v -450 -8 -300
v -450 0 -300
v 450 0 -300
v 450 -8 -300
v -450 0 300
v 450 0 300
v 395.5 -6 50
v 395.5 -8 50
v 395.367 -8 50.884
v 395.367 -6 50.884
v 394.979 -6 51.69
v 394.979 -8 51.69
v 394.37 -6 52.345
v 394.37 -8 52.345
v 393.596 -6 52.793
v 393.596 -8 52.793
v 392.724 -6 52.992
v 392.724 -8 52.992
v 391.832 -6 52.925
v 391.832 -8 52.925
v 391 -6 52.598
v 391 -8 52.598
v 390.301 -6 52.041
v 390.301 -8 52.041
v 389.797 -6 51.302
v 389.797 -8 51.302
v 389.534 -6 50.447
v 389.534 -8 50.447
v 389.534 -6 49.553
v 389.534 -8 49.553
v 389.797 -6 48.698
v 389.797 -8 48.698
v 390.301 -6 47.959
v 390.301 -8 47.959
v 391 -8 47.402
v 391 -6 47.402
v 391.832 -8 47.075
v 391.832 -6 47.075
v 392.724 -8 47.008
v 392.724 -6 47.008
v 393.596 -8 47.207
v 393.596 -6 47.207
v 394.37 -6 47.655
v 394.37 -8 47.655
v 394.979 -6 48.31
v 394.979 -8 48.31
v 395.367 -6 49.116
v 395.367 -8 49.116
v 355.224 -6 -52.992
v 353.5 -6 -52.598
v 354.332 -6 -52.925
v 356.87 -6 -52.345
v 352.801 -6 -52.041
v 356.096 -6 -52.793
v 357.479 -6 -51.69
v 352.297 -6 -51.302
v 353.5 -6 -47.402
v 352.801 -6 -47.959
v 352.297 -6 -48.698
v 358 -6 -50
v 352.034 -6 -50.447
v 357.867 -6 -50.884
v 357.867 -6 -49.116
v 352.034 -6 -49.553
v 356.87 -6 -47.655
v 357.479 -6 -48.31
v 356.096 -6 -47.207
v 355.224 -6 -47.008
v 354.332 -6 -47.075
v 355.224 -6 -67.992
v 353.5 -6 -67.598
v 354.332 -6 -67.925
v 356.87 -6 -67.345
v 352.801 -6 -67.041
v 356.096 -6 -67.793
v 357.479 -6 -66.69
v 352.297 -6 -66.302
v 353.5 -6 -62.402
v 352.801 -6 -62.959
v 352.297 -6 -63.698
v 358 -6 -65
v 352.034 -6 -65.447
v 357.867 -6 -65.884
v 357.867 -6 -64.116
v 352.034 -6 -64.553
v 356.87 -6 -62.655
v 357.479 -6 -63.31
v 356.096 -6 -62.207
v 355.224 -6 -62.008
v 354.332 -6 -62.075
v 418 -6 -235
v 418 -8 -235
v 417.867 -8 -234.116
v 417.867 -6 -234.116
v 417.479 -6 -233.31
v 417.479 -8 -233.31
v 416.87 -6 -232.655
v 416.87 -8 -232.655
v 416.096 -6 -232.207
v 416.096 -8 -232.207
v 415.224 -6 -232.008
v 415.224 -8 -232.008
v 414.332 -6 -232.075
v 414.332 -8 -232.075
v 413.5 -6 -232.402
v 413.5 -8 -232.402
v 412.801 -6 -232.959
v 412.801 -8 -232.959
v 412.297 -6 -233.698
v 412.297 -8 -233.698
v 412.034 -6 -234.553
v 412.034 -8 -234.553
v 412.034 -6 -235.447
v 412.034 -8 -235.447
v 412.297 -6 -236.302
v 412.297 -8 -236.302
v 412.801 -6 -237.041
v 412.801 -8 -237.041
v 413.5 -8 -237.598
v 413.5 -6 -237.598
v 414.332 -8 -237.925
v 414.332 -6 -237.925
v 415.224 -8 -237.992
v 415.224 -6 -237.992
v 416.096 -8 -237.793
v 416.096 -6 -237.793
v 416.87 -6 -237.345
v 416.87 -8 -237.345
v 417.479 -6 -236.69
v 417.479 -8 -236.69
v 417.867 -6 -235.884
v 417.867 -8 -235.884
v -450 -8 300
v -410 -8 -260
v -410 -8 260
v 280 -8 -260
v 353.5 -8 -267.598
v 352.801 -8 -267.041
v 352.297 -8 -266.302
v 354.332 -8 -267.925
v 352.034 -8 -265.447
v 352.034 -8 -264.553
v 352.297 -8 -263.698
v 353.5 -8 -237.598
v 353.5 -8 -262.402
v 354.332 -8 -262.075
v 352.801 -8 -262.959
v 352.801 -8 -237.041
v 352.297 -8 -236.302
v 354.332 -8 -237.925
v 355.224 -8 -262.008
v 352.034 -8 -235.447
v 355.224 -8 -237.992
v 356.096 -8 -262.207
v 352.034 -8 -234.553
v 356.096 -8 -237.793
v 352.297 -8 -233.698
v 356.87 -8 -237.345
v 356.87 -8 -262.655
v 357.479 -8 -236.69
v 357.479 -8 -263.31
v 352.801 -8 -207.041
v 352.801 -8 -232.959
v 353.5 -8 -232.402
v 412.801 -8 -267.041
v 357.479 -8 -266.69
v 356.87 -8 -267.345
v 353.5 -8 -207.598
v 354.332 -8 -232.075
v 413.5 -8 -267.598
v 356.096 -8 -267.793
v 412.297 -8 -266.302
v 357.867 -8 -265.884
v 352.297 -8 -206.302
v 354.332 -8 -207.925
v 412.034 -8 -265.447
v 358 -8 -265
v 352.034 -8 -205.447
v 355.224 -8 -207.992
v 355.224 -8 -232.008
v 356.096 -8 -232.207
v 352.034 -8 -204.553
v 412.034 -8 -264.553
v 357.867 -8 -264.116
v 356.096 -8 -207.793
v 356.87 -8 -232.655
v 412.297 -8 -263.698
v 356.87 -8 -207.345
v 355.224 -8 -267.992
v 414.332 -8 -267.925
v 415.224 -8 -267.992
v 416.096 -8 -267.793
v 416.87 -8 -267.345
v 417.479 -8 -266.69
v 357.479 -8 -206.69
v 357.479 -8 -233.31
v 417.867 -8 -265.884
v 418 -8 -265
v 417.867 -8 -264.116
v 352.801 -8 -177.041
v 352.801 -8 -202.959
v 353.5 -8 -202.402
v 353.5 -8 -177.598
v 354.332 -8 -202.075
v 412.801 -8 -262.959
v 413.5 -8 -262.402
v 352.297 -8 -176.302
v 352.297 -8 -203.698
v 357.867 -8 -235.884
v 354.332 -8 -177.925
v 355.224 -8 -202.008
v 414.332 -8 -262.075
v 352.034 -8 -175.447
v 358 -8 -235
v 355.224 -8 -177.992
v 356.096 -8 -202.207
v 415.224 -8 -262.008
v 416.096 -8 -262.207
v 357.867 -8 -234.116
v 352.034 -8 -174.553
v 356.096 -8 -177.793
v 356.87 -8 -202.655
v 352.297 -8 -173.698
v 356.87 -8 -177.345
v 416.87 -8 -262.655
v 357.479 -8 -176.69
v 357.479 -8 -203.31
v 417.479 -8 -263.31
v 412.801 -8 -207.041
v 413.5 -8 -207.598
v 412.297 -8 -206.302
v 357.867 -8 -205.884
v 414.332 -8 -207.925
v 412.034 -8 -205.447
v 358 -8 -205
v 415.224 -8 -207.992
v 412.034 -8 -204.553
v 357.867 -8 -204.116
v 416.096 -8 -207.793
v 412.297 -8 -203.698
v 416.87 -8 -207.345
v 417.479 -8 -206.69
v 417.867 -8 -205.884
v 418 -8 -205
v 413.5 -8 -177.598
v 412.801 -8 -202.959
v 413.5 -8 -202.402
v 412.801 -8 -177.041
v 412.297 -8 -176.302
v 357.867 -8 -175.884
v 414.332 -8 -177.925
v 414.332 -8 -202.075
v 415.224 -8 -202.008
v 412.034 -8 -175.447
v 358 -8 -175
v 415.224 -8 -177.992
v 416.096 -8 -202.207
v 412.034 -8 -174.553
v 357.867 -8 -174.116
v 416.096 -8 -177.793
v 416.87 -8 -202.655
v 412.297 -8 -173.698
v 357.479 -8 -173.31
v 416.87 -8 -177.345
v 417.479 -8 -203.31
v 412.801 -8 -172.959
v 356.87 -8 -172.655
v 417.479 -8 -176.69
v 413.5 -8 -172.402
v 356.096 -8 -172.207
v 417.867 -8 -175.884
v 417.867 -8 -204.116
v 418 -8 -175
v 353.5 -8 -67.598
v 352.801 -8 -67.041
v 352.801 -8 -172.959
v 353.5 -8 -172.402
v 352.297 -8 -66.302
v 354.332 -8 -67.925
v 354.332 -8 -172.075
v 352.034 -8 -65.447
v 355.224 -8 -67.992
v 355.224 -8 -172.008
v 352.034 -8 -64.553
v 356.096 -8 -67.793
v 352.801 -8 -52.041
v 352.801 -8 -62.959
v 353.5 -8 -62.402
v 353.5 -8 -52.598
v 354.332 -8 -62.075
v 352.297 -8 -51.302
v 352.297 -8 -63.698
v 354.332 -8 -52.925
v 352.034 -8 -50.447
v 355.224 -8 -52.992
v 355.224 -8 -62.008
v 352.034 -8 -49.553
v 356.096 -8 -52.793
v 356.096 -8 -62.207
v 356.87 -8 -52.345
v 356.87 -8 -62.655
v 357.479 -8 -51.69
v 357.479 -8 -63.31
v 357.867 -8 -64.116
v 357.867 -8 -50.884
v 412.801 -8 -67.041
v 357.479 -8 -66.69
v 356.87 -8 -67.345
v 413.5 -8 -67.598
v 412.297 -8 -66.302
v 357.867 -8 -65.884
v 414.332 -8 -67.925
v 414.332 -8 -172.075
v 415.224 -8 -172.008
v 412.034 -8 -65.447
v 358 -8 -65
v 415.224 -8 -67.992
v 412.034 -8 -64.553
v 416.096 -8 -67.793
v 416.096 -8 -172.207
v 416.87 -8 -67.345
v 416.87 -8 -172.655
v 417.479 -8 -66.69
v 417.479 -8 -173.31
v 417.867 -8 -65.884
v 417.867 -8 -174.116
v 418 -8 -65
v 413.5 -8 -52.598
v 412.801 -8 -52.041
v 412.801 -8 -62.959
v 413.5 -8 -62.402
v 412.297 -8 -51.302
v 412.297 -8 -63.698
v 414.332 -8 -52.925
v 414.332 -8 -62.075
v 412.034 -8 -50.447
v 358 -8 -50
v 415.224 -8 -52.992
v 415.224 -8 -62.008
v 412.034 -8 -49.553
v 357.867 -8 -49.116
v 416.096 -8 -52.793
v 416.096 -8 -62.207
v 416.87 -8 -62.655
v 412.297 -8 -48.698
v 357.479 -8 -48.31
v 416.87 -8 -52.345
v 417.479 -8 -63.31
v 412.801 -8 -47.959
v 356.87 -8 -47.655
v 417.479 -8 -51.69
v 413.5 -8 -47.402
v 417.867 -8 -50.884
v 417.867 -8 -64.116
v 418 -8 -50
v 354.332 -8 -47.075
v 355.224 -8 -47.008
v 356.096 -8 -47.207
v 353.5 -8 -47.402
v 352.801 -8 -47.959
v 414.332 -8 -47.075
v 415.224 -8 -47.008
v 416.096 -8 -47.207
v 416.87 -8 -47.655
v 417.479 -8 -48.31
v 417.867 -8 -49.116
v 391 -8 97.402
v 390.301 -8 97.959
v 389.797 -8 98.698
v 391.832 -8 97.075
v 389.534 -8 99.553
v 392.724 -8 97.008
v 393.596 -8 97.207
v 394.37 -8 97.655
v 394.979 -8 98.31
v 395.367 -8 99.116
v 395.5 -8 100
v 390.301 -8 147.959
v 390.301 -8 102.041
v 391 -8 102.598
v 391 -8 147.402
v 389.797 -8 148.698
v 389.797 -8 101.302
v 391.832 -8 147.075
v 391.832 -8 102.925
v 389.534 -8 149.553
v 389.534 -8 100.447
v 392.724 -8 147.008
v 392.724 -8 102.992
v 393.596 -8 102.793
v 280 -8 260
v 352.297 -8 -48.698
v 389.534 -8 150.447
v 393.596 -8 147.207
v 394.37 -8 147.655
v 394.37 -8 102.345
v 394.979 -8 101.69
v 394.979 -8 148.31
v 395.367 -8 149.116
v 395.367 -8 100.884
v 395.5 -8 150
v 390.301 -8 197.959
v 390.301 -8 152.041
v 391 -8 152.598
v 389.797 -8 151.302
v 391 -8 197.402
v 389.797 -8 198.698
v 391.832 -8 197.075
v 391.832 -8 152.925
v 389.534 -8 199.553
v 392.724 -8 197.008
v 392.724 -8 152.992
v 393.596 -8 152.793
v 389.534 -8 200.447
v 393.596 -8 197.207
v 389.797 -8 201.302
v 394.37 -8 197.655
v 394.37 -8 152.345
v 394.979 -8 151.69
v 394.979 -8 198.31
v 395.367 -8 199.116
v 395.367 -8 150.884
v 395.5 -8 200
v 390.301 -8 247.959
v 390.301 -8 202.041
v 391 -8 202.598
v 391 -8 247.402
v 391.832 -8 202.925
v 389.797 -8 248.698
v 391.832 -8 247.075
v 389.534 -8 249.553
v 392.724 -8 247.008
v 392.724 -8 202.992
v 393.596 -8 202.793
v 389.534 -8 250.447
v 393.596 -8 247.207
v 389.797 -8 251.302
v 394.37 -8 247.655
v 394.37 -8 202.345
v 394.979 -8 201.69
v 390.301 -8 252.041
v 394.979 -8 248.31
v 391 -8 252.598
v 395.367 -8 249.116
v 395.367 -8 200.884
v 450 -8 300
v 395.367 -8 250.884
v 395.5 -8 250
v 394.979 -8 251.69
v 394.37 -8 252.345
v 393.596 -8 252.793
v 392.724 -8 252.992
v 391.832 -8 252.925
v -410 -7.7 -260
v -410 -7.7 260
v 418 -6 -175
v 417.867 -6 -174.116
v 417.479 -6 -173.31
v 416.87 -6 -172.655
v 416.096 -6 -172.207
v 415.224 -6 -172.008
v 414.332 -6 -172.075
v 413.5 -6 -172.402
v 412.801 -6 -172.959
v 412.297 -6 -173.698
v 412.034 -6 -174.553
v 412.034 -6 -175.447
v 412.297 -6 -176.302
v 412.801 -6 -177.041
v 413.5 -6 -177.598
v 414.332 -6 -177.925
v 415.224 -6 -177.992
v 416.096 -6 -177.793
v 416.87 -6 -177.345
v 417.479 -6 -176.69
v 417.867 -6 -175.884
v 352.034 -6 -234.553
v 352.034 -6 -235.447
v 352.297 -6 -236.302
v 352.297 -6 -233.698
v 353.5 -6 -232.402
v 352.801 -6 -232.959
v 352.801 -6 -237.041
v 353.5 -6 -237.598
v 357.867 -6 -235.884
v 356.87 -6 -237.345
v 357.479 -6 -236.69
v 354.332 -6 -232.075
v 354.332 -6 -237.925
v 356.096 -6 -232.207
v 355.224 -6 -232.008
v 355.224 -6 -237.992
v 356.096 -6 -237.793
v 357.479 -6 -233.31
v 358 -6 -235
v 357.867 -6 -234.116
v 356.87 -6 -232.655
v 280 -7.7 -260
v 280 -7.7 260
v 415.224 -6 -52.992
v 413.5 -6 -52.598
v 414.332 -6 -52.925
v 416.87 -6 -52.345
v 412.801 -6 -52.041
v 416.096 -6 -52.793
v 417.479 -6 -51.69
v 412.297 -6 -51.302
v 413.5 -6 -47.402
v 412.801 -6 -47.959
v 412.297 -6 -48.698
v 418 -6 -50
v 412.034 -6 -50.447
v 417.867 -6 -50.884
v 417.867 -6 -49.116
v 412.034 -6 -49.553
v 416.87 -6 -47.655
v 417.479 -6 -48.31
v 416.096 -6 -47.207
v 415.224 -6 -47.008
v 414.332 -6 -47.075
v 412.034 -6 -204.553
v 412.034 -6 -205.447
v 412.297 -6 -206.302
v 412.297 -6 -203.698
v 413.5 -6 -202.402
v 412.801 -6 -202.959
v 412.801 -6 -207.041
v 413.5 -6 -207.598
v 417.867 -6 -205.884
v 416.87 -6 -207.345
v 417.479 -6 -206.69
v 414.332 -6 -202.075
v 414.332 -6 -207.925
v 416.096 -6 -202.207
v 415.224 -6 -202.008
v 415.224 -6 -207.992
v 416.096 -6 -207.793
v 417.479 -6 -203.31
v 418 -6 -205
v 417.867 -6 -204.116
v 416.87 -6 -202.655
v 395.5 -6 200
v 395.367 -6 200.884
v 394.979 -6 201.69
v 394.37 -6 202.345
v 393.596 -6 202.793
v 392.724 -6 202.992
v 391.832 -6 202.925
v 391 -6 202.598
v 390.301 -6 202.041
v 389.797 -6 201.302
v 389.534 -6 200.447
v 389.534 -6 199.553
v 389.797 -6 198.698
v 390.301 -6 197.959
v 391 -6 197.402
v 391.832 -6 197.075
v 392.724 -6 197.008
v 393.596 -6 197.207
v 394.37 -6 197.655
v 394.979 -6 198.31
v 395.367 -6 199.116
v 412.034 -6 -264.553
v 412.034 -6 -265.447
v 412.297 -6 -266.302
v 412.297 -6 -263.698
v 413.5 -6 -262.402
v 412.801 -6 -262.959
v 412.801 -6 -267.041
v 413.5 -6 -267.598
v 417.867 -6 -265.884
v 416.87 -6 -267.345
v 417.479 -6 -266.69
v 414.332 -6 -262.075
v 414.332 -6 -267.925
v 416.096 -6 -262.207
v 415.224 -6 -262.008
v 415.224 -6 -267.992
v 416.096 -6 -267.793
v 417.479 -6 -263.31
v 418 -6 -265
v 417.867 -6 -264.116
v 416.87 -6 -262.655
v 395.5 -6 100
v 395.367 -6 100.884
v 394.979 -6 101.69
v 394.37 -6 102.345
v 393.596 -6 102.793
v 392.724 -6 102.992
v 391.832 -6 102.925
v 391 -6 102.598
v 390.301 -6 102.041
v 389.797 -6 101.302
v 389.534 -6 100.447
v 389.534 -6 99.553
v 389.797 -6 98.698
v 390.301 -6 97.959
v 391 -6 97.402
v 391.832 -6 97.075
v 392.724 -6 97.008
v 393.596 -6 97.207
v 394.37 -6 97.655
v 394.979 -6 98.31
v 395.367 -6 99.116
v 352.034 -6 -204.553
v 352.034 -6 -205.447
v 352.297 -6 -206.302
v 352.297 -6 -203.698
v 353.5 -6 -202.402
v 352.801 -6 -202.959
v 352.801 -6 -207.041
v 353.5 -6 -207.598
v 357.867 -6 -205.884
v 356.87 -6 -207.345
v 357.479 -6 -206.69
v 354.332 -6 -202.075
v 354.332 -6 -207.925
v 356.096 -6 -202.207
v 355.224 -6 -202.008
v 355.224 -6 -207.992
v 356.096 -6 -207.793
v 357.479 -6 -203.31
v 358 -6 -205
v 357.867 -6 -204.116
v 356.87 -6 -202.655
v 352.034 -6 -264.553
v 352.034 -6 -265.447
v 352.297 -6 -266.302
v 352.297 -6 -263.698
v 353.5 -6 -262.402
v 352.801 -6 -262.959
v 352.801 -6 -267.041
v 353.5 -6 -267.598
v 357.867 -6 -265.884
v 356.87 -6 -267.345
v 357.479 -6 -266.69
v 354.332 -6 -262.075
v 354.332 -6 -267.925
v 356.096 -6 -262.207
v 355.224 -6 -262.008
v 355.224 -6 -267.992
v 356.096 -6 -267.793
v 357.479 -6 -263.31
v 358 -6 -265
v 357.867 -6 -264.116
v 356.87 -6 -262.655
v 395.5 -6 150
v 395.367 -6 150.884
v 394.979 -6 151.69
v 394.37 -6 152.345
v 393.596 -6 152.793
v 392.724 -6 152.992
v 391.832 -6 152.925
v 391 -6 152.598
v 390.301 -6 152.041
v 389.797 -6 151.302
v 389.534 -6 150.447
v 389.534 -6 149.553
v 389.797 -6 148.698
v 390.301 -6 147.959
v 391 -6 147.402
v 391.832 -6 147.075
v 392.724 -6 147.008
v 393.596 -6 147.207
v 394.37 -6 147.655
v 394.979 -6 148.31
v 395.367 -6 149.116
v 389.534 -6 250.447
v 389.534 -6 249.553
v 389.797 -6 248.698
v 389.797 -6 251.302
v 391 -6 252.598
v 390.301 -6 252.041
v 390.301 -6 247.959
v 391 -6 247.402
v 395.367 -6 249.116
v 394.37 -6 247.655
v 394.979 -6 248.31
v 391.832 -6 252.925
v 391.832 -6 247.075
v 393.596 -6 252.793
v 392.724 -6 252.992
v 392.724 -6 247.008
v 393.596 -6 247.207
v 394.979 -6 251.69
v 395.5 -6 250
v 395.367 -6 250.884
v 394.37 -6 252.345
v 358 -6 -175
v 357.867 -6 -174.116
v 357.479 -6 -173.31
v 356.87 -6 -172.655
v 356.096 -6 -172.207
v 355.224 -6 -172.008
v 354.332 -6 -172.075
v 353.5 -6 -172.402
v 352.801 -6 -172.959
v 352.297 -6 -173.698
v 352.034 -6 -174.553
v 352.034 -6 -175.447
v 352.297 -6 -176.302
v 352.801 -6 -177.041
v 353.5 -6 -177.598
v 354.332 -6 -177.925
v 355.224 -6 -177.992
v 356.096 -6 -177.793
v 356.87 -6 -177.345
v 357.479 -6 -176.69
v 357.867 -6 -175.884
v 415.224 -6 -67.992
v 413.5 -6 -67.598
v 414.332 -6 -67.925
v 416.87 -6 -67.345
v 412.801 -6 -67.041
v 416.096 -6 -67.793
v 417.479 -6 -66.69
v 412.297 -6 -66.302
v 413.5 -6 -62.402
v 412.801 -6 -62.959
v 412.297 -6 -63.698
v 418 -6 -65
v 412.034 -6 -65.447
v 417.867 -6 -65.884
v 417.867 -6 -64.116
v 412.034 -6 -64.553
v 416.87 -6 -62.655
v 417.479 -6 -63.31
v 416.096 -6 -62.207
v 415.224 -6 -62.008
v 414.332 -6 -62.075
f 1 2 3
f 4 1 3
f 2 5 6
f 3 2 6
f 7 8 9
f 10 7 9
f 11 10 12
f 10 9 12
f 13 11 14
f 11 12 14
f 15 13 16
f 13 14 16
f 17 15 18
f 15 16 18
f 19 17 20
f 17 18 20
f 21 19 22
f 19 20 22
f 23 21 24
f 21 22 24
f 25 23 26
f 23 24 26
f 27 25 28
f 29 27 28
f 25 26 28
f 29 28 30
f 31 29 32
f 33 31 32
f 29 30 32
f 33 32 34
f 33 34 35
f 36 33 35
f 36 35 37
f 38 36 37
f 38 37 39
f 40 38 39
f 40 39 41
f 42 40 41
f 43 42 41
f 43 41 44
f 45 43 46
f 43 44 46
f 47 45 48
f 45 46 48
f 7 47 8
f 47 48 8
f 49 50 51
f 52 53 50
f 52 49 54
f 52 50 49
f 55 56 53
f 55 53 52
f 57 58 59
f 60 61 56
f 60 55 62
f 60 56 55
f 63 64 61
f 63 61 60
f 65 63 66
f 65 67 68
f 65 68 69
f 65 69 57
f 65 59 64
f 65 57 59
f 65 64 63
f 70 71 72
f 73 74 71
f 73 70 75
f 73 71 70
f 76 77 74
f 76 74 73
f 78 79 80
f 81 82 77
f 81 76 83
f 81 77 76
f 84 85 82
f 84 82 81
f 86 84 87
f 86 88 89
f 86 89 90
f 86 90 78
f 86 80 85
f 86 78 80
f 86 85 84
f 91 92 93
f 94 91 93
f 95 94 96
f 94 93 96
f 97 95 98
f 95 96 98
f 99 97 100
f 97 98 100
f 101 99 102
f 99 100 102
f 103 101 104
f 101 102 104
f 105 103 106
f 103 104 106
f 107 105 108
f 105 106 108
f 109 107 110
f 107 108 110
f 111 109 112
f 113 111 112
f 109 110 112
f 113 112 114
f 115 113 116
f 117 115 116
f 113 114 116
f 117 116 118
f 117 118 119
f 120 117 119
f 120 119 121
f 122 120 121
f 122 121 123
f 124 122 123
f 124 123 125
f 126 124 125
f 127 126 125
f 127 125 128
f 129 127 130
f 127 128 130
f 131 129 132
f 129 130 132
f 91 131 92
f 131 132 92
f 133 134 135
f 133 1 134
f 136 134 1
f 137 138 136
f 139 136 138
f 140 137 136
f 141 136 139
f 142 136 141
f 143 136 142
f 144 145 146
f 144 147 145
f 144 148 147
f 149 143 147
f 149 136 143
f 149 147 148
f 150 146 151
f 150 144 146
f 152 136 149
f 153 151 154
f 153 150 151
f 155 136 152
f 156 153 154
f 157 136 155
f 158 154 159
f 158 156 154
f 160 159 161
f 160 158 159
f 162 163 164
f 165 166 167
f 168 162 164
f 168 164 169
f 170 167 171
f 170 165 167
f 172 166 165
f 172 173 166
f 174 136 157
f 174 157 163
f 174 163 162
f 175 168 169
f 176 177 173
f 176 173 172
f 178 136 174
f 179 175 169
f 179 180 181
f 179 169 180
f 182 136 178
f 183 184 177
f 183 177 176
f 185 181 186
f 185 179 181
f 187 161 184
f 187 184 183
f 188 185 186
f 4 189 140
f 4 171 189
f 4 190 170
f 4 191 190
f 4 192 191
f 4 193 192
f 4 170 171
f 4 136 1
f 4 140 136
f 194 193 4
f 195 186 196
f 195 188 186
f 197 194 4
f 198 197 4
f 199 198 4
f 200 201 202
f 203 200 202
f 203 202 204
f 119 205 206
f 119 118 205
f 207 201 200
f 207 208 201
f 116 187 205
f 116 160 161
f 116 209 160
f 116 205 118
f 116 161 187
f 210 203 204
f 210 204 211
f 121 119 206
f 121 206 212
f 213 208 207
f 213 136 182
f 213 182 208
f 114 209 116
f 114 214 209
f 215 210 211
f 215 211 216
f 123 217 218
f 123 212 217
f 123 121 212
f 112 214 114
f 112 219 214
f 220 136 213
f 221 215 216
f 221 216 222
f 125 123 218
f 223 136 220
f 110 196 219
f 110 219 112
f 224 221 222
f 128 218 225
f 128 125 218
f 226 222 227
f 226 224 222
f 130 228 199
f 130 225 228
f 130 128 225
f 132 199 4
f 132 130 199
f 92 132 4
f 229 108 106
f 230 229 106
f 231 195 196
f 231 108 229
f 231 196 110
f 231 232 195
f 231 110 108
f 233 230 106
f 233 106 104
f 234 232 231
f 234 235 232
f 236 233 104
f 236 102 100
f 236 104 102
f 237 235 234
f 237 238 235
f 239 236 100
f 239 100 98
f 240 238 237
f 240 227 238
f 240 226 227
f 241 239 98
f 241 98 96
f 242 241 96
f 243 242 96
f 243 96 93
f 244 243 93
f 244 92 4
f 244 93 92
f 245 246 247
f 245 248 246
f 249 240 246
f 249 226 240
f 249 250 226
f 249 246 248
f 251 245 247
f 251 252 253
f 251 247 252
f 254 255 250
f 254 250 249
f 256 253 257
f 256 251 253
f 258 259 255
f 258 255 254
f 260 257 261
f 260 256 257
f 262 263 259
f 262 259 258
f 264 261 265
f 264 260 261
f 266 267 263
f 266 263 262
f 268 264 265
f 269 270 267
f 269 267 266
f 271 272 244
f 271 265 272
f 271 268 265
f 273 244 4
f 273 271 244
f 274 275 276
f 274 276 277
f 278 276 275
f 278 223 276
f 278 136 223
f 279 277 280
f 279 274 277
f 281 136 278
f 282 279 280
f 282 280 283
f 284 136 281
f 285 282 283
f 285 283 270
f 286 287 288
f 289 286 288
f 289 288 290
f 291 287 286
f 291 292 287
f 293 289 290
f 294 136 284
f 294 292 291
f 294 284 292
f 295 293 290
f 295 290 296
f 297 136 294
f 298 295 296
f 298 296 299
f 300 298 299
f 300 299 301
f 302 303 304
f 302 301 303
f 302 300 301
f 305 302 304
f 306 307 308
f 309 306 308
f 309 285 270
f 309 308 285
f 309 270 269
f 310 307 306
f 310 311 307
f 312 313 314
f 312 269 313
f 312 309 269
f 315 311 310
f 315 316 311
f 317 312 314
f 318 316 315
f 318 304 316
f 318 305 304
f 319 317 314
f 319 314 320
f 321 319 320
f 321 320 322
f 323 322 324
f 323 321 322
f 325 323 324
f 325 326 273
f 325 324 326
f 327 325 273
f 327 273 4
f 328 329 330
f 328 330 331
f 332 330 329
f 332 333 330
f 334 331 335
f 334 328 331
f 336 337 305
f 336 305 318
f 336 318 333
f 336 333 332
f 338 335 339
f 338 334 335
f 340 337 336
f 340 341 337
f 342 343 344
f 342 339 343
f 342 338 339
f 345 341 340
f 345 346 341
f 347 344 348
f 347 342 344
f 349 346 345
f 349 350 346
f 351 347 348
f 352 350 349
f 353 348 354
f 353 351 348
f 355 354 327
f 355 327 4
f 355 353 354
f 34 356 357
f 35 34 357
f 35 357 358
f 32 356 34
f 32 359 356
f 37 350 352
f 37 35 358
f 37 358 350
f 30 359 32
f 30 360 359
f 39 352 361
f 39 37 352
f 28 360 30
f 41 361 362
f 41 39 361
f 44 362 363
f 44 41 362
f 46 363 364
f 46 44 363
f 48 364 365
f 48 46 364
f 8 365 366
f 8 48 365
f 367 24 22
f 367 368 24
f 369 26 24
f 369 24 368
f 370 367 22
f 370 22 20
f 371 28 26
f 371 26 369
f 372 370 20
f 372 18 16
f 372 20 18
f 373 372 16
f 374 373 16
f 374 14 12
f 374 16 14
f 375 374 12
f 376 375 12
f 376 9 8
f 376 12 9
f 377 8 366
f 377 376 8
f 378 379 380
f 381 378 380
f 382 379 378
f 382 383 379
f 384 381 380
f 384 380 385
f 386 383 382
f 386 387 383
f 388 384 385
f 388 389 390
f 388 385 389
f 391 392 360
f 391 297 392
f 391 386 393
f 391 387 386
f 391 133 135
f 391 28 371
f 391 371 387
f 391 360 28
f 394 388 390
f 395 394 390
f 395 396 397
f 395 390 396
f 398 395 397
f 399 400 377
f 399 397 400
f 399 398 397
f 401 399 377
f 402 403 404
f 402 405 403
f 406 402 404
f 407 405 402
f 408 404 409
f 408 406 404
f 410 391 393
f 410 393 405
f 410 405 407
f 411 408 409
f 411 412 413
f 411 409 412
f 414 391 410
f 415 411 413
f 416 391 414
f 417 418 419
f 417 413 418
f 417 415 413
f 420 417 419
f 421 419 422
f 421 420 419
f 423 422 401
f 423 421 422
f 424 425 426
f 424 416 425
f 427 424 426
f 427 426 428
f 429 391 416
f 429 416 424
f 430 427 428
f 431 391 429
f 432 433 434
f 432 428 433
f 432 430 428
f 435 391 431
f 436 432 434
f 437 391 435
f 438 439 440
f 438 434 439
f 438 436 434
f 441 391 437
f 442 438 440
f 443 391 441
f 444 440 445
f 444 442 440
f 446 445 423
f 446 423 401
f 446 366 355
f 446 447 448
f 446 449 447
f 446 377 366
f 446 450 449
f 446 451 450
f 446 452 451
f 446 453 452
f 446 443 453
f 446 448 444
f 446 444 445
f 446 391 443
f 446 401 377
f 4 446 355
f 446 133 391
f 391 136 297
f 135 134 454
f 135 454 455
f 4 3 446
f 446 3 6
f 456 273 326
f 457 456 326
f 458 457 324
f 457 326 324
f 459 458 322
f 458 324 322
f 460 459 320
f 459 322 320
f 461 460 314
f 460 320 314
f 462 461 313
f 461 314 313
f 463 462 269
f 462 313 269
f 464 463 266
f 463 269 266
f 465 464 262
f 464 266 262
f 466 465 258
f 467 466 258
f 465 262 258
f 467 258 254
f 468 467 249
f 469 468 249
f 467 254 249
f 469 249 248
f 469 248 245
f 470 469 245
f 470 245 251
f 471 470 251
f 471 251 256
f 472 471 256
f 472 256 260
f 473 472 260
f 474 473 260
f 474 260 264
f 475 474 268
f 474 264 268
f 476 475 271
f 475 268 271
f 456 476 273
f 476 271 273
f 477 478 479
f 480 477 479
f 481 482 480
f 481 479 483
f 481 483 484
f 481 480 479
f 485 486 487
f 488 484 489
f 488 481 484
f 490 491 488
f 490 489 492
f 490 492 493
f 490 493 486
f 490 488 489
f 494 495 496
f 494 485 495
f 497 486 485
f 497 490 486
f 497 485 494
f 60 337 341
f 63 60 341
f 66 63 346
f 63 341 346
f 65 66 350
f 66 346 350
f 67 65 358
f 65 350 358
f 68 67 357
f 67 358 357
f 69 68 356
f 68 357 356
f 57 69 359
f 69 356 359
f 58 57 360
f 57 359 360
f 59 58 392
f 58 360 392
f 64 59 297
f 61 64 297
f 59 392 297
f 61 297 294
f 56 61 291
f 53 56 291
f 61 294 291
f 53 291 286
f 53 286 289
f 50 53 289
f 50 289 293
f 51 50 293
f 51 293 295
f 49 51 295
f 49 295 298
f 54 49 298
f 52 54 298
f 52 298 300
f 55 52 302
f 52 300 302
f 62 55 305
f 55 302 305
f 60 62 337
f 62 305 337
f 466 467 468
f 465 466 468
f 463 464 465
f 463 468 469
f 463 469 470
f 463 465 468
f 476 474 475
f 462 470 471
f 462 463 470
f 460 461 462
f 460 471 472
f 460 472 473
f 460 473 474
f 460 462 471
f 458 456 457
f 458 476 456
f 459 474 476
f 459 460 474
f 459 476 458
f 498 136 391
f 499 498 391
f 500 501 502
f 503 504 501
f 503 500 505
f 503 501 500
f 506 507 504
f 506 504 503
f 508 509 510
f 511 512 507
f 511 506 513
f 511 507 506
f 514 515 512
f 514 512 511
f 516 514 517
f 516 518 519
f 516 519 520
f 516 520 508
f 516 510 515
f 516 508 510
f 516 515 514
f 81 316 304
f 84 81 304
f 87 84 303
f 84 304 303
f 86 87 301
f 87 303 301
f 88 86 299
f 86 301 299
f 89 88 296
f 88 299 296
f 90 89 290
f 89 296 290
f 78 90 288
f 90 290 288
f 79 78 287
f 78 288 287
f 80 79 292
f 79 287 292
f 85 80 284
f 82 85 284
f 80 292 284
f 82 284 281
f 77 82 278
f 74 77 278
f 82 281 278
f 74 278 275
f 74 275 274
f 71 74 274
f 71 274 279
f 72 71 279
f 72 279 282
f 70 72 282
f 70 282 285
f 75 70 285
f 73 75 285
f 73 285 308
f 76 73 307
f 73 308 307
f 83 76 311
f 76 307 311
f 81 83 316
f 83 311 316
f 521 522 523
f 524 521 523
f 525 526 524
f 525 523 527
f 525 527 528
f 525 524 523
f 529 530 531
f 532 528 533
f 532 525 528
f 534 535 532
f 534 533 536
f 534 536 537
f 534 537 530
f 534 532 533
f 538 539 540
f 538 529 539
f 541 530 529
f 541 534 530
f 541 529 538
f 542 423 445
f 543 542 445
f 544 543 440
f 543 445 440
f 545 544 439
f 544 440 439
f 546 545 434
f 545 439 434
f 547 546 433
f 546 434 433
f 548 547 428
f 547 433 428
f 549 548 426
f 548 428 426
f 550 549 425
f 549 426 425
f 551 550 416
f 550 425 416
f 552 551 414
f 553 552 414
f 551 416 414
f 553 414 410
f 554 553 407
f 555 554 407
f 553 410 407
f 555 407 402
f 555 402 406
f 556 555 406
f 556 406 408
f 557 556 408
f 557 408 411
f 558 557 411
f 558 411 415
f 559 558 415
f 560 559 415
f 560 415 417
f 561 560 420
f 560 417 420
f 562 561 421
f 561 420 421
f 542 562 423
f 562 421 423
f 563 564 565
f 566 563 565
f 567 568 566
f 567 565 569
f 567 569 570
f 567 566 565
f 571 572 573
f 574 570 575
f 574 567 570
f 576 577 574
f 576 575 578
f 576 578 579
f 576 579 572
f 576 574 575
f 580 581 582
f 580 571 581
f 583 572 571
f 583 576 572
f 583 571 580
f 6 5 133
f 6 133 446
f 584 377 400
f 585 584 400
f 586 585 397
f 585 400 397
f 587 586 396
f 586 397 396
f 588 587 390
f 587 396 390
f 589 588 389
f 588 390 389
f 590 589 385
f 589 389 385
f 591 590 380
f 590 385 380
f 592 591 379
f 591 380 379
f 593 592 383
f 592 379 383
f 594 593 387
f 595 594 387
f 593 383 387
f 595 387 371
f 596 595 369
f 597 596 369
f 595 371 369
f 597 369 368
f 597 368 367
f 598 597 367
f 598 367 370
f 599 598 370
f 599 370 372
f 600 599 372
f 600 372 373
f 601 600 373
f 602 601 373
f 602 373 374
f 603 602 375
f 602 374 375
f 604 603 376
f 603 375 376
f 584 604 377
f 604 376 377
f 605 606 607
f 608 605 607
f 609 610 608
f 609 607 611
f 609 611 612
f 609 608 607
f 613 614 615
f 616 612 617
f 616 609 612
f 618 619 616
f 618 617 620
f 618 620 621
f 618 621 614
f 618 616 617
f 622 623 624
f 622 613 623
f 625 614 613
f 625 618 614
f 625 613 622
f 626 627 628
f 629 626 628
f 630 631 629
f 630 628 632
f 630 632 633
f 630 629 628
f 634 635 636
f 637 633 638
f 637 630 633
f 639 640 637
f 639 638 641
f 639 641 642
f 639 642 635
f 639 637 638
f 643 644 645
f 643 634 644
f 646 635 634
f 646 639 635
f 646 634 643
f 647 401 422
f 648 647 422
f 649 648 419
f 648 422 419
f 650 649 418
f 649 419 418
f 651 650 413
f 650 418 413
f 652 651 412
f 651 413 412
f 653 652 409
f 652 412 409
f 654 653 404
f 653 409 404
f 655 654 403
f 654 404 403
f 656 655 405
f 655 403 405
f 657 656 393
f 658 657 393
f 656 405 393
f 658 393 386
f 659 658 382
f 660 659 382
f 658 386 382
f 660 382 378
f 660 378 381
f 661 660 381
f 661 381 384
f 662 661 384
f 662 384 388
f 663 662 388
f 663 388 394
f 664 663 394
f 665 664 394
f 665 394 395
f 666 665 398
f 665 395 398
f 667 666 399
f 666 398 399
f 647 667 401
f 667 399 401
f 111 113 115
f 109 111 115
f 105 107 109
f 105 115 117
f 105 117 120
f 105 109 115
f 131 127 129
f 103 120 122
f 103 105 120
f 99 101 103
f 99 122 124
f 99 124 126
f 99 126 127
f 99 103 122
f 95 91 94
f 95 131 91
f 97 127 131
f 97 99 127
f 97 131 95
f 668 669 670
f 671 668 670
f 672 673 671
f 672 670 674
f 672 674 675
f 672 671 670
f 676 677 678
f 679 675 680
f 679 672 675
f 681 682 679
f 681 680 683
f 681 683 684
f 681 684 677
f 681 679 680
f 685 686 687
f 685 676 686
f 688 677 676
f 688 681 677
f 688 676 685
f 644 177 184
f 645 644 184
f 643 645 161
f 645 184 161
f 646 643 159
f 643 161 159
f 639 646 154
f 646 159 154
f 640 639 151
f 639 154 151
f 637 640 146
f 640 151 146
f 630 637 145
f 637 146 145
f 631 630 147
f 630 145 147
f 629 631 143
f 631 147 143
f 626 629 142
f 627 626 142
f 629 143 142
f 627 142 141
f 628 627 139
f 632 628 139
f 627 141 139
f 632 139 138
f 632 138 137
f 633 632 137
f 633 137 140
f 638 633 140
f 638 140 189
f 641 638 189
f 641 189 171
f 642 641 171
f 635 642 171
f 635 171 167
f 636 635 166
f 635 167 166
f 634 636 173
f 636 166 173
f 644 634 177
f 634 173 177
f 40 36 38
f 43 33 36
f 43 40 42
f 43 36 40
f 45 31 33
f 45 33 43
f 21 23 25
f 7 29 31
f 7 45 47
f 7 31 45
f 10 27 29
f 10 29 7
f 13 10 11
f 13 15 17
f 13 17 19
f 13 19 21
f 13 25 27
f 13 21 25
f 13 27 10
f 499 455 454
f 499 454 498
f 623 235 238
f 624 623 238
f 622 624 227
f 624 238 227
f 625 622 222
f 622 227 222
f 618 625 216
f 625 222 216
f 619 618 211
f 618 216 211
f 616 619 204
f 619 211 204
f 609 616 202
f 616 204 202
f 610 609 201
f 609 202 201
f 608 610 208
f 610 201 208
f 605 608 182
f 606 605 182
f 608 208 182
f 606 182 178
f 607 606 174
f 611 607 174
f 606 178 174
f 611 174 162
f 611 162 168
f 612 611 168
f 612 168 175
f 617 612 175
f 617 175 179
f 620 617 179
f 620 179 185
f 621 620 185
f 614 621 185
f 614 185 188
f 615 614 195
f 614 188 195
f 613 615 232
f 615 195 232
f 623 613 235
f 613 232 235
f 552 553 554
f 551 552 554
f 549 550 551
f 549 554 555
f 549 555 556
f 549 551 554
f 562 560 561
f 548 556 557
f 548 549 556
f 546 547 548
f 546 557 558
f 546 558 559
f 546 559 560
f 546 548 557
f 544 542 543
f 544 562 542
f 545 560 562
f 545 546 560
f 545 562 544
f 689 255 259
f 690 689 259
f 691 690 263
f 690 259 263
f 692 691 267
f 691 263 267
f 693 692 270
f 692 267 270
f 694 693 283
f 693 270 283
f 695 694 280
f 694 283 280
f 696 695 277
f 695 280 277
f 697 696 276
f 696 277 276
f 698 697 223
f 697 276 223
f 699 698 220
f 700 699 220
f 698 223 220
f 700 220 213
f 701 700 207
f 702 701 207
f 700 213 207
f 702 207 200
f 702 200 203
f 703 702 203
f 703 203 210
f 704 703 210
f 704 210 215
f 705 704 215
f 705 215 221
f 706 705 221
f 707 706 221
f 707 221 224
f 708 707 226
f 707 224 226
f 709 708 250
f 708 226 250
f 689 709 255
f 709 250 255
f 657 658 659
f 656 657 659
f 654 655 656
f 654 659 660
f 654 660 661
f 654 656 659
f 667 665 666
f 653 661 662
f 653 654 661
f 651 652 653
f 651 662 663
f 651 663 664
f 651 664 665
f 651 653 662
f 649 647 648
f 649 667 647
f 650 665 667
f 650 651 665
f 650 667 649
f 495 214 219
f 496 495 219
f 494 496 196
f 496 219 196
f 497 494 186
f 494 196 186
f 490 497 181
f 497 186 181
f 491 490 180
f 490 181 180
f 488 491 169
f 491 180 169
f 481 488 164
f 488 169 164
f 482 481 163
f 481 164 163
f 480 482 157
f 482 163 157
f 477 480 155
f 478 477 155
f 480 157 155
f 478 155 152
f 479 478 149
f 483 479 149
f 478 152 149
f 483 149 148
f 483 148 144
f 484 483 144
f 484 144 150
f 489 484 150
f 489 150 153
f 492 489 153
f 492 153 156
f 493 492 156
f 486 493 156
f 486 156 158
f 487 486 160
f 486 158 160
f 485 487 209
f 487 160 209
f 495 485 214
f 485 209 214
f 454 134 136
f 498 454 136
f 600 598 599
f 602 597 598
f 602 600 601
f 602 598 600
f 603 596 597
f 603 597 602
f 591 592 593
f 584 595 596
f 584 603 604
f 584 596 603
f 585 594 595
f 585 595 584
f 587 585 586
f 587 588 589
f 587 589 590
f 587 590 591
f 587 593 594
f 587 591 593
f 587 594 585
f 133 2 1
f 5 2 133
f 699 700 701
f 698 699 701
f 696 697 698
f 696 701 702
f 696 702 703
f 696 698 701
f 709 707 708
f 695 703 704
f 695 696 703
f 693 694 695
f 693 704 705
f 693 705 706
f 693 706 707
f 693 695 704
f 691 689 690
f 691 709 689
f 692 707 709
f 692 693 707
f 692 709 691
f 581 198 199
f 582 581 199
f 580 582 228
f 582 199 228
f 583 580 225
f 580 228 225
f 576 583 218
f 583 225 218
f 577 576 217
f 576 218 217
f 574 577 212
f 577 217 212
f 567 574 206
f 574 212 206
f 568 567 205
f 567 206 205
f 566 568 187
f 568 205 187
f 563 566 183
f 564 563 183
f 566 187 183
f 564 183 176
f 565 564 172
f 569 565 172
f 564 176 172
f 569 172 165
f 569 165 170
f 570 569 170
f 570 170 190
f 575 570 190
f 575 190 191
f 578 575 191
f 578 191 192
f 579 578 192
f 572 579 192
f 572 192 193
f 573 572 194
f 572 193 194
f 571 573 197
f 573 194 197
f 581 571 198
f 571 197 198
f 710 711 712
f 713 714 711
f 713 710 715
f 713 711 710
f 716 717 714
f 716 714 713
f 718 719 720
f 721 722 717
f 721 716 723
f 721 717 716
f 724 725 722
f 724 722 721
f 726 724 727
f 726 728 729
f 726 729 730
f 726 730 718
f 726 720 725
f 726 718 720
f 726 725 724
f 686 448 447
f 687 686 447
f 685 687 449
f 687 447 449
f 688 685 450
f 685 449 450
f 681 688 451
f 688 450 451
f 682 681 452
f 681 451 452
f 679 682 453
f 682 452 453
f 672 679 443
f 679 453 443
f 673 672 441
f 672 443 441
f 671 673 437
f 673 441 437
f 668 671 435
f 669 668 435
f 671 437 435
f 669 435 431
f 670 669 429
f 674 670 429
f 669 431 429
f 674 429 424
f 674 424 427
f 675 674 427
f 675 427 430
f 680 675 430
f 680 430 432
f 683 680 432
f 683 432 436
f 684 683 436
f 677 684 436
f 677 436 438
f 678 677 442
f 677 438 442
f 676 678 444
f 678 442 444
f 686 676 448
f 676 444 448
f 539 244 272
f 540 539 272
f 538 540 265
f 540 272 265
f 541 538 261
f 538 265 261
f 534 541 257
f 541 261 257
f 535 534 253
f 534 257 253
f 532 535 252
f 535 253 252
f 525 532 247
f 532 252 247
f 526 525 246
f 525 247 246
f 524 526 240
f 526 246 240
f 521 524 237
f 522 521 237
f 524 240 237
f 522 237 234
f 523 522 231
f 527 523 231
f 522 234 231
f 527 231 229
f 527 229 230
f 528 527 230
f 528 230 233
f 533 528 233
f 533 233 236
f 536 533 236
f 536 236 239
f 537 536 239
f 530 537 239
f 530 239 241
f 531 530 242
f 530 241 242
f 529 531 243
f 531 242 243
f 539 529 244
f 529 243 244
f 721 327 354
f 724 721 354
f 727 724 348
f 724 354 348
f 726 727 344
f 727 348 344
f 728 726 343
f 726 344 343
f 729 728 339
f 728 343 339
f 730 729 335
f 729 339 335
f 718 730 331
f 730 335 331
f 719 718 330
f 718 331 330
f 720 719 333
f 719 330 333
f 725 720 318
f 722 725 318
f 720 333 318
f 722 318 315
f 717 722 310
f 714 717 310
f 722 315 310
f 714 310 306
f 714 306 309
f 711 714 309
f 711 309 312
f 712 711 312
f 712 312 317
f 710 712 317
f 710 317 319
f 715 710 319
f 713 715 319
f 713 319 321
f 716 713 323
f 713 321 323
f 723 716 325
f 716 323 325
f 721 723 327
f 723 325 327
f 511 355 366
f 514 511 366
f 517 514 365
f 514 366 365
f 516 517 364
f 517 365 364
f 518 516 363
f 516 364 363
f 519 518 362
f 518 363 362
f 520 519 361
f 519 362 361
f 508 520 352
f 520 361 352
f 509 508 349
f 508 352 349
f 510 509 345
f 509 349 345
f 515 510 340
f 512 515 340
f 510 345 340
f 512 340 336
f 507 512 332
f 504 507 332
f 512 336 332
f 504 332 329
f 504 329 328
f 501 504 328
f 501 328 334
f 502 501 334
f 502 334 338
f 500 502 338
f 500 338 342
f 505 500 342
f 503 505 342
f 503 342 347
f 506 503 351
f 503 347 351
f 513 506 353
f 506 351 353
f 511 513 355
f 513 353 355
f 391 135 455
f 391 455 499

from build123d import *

# Parameters (mm, degrees)
F0_W     = 900
F0_H     = 600
F1_DEPTH = 8
F2_W     = 690
F2_H     = 520
F3_DEPTH = 0.3
F4_R     = 3
F5_DEPTH = 2


with BuildPart() as f1:
    # F0 (on Front) → F1 (new body)
    with BuildSketch(Plane.XZ):
        Rectangle(F0_W, F0_H)
    extrude(amount=F1_DEPTH)

    # F2 (on face) → F3 (cut)
    with BuildSketch(Plane.XZ.offset(8)):
        with Locations((-65, 0)):
            Rectangle(F2_W, F2_H)
    extrude(amount=-F3_DEPTH, mode=Mode.SUBTRACT)

    # F4 (on face) → F5 (cut)
    with BuildSketch(Plane.XZ.offset(8)):
        with Locations((392.5, 100)):
            Circle(F4_R)
        with Locations((392.5, 150)):
            Circle(F4_R)
        with Locations((415, -65)):
            Circle(F4_R)
        with Locations((392.5, 50)):
            Circle(F4_R)
        with Locations((355, -50)):
            Circle(F4_R)
        with Locations((415, -50)):
            Circle(F4_R)
        with Locations((415, -175)):
            Circle(F4_R)
        with Locations((415, -205)):
            Circle(F4_R)
        with Locations((415, -235)):
            Circle(F4_R)
        with Locations((415, -265)):
            Circle(F4_R)
        with Locations((355, -265)):
            Circle(F4_R)
        with Locations((355, -65)):
            Circle(F4_R)
        with Locations((355, -175)):
            Circle(F4_R)
        with Locations((355, -205)):
            Circle(F4_R)
        with Locations((355, -235)):
            Circle(F4_R)
        with Locations((392.5, 200)):
            Circle(F4_R)
        with Locations((392.5, 250)):
            Circle(F4_R)
    extrude(amount=-F5_DEPTH, mode=Mode.SUBTRACT)


solid = f1.part
